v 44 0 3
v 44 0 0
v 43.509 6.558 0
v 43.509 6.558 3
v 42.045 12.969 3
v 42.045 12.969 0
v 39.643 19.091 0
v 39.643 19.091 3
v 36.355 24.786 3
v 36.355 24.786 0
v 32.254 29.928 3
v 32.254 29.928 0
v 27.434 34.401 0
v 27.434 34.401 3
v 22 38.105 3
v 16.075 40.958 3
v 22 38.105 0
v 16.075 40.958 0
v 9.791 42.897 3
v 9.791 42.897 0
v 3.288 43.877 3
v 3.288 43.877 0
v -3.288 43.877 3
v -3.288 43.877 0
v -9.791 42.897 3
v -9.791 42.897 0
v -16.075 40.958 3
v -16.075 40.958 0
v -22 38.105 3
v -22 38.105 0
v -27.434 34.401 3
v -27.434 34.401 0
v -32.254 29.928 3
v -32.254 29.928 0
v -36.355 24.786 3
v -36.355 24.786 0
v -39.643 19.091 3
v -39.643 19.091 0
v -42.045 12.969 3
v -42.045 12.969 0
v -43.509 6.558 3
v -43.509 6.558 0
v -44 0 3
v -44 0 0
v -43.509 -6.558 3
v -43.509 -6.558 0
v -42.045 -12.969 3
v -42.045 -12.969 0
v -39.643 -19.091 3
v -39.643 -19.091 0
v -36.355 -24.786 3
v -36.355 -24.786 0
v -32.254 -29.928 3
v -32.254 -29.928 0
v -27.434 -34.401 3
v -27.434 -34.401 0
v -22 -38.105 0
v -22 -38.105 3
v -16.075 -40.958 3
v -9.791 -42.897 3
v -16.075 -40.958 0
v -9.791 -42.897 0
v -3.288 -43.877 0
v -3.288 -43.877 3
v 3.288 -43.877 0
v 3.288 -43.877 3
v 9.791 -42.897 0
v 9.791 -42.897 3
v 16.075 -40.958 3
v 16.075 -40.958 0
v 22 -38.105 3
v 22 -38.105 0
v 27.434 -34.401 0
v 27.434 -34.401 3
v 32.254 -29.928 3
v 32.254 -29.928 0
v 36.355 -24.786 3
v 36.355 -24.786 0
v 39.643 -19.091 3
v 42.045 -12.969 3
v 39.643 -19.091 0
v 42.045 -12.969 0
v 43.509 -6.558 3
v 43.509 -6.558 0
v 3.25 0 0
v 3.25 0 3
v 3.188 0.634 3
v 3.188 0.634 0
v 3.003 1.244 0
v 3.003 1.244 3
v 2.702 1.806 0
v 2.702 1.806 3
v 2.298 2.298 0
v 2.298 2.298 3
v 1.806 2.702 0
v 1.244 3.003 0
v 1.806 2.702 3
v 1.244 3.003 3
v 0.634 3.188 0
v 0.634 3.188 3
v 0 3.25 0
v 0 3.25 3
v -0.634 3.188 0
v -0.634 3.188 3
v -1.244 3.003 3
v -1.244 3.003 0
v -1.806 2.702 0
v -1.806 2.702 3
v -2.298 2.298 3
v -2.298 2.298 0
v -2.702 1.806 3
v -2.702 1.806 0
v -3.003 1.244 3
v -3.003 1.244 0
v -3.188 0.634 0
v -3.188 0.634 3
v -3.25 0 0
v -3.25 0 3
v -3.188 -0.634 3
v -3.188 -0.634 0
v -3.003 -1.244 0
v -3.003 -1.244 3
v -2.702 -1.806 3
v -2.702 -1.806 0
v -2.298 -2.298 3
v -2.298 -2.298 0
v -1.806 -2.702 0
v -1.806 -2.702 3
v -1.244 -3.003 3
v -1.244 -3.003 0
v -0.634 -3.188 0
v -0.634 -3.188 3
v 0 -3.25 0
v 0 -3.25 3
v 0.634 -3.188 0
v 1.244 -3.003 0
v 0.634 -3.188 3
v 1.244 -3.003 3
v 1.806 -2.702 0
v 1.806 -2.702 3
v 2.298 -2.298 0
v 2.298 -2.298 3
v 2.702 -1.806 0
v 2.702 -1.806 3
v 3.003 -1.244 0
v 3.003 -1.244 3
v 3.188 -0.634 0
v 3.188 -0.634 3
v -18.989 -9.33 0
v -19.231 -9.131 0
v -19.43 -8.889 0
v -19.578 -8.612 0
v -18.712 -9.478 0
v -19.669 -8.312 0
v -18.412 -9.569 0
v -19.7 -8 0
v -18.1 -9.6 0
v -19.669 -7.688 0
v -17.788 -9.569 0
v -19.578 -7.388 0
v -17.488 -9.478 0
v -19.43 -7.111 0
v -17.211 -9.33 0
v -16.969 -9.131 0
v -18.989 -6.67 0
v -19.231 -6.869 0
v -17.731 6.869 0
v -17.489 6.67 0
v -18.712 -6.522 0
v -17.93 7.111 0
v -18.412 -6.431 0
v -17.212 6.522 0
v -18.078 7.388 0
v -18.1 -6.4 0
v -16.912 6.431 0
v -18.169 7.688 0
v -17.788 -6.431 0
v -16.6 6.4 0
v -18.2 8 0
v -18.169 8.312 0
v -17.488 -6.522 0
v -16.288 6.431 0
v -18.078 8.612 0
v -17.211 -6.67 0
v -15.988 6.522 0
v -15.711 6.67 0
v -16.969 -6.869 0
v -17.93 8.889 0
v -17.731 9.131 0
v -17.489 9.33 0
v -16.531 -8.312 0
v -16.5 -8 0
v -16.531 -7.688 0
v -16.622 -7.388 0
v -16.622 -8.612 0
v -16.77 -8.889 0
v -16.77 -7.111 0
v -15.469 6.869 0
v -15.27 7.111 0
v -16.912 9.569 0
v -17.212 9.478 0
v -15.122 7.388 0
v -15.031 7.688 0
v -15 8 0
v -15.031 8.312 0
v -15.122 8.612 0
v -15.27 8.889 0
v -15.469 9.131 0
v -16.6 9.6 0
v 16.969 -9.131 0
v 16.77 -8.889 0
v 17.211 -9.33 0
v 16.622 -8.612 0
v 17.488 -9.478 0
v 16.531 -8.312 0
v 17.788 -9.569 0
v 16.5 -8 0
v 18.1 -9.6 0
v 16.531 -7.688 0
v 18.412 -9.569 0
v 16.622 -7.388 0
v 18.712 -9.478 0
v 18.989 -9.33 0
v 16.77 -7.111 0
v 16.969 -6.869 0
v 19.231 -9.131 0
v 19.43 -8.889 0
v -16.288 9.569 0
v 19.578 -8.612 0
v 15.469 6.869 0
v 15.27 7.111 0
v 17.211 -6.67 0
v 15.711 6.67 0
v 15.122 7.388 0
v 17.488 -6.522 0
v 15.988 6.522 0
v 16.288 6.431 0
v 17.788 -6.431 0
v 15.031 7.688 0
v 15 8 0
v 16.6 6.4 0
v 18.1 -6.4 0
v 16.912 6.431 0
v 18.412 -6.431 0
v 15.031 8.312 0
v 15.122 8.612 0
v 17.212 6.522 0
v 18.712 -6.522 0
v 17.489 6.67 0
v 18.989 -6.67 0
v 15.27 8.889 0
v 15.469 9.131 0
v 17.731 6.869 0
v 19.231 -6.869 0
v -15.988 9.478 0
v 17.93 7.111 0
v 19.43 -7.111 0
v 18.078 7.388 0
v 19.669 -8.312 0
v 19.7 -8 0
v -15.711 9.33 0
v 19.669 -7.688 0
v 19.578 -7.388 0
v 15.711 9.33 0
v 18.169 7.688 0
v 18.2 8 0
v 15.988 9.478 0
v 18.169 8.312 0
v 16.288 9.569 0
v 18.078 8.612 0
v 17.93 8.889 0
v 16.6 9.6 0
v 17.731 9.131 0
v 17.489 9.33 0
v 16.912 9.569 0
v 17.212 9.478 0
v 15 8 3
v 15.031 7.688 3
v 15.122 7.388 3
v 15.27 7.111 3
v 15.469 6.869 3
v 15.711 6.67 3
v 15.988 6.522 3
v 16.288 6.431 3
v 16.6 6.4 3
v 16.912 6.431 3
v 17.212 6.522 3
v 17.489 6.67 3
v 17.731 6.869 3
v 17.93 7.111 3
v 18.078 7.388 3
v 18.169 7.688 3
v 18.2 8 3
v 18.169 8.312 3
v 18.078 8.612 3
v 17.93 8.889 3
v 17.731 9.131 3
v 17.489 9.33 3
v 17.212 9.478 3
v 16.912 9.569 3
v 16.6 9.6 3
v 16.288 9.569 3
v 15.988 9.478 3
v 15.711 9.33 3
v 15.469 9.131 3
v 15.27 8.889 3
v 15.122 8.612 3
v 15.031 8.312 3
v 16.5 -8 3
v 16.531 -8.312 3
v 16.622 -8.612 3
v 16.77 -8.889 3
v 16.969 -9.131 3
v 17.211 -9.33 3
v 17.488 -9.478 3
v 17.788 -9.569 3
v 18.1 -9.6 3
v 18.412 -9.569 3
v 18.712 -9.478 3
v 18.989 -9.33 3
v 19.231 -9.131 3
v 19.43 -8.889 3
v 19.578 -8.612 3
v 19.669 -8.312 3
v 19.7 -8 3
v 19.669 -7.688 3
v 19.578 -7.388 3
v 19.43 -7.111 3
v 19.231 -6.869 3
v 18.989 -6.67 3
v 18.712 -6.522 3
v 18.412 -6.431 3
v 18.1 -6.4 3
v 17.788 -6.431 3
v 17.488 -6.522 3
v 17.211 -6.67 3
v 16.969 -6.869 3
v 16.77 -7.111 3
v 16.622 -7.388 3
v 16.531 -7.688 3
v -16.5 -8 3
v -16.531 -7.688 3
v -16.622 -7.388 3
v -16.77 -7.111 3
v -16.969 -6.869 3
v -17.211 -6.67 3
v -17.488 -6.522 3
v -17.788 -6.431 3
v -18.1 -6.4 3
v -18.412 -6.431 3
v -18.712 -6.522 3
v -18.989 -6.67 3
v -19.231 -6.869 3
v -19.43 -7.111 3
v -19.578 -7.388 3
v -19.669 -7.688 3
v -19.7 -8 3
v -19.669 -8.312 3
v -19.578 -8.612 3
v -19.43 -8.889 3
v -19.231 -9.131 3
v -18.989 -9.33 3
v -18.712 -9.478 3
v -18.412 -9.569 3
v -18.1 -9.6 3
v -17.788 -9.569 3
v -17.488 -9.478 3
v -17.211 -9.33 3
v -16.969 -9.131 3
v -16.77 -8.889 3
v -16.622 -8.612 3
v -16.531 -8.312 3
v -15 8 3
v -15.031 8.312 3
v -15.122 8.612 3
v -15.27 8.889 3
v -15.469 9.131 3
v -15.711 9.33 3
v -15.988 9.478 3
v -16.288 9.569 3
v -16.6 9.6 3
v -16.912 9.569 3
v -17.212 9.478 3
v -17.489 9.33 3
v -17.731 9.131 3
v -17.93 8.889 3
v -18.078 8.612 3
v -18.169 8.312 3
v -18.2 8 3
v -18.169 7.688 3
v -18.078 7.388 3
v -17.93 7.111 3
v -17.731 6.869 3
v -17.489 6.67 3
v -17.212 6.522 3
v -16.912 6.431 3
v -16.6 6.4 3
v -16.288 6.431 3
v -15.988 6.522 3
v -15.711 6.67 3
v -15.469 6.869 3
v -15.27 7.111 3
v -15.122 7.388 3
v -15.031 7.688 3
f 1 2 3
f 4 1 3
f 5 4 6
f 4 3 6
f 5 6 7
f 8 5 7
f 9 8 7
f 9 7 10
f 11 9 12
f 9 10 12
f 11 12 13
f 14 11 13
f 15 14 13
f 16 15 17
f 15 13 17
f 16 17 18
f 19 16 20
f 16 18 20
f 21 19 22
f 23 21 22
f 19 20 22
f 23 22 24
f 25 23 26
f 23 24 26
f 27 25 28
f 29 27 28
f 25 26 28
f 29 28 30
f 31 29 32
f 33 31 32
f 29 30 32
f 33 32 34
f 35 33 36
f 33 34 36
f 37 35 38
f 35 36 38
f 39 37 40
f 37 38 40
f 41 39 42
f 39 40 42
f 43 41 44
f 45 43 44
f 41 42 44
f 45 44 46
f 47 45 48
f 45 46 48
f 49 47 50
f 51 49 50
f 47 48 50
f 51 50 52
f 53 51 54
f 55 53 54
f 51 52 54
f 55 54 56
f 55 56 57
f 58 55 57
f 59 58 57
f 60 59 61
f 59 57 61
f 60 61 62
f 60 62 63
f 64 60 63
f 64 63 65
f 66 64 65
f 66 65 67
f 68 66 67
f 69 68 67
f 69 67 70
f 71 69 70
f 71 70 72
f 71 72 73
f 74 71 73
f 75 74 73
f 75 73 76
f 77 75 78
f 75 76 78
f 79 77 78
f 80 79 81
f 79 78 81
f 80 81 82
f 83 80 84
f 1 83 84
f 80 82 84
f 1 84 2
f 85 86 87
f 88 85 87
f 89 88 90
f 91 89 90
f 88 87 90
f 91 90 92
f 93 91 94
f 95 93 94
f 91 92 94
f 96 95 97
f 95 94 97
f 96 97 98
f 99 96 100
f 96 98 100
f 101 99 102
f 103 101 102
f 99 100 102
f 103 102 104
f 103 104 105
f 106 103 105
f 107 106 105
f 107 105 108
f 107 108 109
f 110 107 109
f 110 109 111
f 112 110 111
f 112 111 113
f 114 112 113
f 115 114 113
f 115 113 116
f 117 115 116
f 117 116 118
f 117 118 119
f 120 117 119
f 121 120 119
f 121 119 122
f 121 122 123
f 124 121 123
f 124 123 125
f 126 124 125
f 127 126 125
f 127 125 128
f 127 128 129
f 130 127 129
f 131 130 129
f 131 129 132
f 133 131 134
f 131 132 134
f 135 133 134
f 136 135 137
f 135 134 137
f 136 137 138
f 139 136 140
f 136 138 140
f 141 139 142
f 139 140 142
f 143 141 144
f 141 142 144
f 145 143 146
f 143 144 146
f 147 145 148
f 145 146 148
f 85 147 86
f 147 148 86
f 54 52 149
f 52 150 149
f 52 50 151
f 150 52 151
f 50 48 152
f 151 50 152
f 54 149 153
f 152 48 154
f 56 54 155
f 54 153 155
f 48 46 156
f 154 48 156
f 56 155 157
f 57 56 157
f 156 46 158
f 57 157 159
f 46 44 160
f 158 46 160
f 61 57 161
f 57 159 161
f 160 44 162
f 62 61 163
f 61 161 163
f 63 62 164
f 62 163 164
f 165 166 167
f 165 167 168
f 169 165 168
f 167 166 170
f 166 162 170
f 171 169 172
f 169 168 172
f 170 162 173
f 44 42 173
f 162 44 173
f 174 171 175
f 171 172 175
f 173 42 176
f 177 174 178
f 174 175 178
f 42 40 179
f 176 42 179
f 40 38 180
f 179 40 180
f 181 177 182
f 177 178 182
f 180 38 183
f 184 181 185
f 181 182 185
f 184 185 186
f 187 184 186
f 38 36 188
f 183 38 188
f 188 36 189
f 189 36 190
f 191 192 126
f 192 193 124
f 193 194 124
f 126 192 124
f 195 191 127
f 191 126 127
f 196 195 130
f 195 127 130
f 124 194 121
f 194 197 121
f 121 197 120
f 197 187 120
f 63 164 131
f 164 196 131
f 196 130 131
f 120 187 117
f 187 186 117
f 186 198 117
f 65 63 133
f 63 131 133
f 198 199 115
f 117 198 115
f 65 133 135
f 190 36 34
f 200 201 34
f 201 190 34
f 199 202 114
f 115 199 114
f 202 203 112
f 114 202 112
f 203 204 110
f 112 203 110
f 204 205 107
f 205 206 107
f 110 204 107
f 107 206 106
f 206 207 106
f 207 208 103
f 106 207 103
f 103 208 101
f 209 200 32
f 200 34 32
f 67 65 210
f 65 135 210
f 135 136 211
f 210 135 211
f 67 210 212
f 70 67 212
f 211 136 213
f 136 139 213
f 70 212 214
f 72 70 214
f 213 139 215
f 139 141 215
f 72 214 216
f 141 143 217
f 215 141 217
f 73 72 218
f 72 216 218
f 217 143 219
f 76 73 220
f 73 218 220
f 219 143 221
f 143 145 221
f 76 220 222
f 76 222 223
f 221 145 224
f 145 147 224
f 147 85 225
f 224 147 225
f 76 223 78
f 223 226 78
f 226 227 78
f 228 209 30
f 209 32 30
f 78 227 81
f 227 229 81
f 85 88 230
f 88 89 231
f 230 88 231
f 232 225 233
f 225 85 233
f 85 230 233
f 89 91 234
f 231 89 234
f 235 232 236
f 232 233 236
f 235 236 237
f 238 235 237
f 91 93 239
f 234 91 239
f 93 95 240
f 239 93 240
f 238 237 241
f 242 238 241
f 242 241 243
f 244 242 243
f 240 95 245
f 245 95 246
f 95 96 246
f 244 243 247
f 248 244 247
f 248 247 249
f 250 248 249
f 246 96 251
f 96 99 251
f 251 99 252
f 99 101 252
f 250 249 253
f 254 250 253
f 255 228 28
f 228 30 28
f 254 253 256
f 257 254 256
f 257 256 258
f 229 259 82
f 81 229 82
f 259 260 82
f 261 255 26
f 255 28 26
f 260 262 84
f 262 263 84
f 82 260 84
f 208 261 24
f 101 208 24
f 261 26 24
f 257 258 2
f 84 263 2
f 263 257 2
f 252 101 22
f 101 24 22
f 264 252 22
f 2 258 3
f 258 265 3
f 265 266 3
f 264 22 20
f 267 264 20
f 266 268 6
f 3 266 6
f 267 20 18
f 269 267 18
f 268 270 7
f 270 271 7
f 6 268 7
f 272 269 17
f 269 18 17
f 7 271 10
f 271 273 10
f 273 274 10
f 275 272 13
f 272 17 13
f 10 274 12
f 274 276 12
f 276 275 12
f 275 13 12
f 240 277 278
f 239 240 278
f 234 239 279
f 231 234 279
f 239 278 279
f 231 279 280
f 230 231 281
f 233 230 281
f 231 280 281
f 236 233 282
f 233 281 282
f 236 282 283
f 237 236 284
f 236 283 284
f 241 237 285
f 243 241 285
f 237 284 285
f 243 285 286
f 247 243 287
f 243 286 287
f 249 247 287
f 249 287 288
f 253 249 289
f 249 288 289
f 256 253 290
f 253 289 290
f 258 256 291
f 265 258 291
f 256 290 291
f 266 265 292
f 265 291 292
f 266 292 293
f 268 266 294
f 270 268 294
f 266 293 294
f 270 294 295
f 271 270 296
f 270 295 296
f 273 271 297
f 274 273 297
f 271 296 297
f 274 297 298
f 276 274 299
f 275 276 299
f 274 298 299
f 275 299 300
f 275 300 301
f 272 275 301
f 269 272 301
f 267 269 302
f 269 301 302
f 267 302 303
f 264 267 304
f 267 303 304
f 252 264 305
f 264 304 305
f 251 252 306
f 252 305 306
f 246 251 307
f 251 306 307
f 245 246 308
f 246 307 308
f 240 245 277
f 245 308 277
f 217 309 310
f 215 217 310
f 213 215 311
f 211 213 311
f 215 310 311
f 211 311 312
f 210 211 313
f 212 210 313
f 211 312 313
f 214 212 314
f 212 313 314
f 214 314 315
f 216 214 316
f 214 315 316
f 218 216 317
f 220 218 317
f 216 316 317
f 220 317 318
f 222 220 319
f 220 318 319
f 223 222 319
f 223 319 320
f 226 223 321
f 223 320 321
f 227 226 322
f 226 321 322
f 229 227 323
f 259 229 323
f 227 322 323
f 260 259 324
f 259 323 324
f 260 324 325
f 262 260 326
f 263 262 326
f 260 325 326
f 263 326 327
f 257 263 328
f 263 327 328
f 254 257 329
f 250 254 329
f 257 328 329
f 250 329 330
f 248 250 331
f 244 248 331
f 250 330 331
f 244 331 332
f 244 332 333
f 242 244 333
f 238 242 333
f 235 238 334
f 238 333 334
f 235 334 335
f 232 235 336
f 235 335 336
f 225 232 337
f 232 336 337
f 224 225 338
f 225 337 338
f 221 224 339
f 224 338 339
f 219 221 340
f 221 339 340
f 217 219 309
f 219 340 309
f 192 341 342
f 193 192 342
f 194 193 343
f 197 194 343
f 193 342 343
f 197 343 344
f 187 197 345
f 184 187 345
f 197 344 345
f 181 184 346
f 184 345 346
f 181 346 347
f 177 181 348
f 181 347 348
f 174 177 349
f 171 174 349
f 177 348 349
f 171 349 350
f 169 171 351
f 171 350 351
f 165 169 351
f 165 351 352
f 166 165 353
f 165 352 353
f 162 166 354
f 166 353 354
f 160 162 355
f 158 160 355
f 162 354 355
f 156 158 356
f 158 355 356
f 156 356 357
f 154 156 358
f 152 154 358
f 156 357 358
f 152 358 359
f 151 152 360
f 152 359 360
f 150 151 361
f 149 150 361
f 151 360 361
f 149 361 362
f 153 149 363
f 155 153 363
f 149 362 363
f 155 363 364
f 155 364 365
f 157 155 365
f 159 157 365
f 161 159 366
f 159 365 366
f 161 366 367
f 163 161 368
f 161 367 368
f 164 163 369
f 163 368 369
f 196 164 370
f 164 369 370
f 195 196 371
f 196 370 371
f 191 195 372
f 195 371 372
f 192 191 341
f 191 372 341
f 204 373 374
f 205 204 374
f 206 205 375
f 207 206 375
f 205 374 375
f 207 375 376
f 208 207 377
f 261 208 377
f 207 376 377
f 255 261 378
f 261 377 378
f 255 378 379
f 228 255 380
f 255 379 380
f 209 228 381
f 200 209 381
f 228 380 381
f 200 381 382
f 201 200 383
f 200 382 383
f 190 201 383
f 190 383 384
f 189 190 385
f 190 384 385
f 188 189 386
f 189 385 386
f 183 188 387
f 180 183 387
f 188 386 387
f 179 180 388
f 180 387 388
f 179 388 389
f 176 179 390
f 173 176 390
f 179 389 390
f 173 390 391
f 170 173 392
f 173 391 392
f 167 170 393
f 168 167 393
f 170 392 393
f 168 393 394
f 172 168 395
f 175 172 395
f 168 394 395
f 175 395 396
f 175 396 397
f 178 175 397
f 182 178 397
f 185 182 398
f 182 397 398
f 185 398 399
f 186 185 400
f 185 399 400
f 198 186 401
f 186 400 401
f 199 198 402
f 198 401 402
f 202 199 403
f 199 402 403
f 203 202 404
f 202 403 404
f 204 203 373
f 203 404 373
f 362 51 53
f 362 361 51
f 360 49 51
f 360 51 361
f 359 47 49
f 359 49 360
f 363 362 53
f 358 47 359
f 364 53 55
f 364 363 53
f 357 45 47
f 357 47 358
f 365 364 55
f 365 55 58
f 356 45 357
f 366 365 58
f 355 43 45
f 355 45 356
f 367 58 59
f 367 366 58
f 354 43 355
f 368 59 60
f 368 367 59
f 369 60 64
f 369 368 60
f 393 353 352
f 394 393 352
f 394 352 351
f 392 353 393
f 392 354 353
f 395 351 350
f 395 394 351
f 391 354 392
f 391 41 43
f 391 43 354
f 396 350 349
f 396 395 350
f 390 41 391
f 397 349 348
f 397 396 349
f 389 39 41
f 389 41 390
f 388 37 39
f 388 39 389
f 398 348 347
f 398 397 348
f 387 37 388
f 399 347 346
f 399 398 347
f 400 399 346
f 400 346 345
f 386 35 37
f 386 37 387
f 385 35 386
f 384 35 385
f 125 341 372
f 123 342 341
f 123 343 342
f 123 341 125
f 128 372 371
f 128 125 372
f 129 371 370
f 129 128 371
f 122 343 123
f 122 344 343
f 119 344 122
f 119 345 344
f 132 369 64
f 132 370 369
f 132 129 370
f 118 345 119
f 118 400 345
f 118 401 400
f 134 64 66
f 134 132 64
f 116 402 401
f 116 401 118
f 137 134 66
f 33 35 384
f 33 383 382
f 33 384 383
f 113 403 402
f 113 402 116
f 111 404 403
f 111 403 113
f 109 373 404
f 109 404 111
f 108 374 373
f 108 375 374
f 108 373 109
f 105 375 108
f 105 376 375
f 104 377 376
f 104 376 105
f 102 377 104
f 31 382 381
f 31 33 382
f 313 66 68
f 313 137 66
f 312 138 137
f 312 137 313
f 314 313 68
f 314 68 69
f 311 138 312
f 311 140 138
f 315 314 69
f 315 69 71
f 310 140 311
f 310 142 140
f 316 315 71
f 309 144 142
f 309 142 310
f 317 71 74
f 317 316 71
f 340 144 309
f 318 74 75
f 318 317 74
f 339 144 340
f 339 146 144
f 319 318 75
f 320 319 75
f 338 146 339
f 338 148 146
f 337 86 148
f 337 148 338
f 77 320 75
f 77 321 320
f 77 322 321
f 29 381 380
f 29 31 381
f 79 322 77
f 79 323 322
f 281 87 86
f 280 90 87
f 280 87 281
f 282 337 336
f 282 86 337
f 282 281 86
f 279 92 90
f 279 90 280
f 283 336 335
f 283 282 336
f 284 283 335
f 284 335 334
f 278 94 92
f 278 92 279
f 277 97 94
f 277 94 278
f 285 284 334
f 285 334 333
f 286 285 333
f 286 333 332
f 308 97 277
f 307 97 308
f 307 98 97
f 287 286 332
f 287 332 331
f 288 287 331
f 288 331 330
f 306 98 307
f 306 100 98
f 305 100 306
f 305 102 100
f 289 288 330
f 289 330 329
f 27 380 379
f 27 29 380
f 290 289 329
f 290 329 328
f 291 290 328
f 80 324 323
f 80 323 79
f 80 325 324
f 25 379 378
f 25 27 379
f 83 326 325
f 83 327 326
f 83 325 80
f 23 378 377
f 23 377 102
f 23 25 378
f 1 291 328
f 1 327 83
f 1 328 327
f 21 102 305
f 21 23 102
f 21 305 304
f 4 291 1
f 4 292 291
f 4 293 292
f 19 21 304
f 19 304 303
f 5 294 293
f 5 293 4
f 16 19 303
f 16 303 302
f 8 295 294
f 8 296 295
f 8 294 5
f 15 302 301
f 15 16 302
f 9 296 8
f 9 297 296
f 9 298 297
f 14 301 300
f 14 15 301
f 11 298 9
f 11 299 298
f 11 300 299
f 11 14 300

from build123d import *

# Parameters (mm, degrees)
SKETCH_1_R          = 44
EXTRUDE_1_DEPTH     = 3
SKETCH_2_R          = 1.6
CUT_EXTRUDE_1_DEPTH = 3
SKETCH_3_R          = 3.25
CUT_EXTRUDE_2_DEPTH = 35


with BuildPart() as part:
    # ｽｹｯﾁ1 → ﾎﾞｽ - 押し出し1 (new body)
    with BuildSketch(Plane.XY):
        Circle(SKETCH_1_R)
    extrude(amount=EXTRUDE_1_DEPTH)

    # ｽｹｯﾁ2 → ｶｯﾄ - 押し出し1 (cut)
    with BuildSketch(Plane.XY.offset(3)):
        with Locations((-16.6, 8)):
            Circle(SKETCH_2_R)
        with Locations((-18.1, -8)):
            Circle(SKETCH_2_R)
        with Locations(Location((18.1, -8, 0), (0, 0, 180))):
            Circle(SKETCH_2_R)
        with Locations(Location((16.6, 8, 0), (0, 0, 180))):
            Circle(SKETCH_2_R)
    extrude(amount=-CUT_EXTRUDE_1_DEPTH, mode=Mode.SUBTRACT)

    # ｽｹｯﾁ3 → ｶｯﾄ - 押し出し2 (cut)
    with BuildSketch(Plane.XY.offset(3)):
        Circle(SKETCH_3_R)
    extrude(amount=-CUT_EXTRUDE_2_DEPTH, mode=Mode.SUBTRACT)


solid = part.part
